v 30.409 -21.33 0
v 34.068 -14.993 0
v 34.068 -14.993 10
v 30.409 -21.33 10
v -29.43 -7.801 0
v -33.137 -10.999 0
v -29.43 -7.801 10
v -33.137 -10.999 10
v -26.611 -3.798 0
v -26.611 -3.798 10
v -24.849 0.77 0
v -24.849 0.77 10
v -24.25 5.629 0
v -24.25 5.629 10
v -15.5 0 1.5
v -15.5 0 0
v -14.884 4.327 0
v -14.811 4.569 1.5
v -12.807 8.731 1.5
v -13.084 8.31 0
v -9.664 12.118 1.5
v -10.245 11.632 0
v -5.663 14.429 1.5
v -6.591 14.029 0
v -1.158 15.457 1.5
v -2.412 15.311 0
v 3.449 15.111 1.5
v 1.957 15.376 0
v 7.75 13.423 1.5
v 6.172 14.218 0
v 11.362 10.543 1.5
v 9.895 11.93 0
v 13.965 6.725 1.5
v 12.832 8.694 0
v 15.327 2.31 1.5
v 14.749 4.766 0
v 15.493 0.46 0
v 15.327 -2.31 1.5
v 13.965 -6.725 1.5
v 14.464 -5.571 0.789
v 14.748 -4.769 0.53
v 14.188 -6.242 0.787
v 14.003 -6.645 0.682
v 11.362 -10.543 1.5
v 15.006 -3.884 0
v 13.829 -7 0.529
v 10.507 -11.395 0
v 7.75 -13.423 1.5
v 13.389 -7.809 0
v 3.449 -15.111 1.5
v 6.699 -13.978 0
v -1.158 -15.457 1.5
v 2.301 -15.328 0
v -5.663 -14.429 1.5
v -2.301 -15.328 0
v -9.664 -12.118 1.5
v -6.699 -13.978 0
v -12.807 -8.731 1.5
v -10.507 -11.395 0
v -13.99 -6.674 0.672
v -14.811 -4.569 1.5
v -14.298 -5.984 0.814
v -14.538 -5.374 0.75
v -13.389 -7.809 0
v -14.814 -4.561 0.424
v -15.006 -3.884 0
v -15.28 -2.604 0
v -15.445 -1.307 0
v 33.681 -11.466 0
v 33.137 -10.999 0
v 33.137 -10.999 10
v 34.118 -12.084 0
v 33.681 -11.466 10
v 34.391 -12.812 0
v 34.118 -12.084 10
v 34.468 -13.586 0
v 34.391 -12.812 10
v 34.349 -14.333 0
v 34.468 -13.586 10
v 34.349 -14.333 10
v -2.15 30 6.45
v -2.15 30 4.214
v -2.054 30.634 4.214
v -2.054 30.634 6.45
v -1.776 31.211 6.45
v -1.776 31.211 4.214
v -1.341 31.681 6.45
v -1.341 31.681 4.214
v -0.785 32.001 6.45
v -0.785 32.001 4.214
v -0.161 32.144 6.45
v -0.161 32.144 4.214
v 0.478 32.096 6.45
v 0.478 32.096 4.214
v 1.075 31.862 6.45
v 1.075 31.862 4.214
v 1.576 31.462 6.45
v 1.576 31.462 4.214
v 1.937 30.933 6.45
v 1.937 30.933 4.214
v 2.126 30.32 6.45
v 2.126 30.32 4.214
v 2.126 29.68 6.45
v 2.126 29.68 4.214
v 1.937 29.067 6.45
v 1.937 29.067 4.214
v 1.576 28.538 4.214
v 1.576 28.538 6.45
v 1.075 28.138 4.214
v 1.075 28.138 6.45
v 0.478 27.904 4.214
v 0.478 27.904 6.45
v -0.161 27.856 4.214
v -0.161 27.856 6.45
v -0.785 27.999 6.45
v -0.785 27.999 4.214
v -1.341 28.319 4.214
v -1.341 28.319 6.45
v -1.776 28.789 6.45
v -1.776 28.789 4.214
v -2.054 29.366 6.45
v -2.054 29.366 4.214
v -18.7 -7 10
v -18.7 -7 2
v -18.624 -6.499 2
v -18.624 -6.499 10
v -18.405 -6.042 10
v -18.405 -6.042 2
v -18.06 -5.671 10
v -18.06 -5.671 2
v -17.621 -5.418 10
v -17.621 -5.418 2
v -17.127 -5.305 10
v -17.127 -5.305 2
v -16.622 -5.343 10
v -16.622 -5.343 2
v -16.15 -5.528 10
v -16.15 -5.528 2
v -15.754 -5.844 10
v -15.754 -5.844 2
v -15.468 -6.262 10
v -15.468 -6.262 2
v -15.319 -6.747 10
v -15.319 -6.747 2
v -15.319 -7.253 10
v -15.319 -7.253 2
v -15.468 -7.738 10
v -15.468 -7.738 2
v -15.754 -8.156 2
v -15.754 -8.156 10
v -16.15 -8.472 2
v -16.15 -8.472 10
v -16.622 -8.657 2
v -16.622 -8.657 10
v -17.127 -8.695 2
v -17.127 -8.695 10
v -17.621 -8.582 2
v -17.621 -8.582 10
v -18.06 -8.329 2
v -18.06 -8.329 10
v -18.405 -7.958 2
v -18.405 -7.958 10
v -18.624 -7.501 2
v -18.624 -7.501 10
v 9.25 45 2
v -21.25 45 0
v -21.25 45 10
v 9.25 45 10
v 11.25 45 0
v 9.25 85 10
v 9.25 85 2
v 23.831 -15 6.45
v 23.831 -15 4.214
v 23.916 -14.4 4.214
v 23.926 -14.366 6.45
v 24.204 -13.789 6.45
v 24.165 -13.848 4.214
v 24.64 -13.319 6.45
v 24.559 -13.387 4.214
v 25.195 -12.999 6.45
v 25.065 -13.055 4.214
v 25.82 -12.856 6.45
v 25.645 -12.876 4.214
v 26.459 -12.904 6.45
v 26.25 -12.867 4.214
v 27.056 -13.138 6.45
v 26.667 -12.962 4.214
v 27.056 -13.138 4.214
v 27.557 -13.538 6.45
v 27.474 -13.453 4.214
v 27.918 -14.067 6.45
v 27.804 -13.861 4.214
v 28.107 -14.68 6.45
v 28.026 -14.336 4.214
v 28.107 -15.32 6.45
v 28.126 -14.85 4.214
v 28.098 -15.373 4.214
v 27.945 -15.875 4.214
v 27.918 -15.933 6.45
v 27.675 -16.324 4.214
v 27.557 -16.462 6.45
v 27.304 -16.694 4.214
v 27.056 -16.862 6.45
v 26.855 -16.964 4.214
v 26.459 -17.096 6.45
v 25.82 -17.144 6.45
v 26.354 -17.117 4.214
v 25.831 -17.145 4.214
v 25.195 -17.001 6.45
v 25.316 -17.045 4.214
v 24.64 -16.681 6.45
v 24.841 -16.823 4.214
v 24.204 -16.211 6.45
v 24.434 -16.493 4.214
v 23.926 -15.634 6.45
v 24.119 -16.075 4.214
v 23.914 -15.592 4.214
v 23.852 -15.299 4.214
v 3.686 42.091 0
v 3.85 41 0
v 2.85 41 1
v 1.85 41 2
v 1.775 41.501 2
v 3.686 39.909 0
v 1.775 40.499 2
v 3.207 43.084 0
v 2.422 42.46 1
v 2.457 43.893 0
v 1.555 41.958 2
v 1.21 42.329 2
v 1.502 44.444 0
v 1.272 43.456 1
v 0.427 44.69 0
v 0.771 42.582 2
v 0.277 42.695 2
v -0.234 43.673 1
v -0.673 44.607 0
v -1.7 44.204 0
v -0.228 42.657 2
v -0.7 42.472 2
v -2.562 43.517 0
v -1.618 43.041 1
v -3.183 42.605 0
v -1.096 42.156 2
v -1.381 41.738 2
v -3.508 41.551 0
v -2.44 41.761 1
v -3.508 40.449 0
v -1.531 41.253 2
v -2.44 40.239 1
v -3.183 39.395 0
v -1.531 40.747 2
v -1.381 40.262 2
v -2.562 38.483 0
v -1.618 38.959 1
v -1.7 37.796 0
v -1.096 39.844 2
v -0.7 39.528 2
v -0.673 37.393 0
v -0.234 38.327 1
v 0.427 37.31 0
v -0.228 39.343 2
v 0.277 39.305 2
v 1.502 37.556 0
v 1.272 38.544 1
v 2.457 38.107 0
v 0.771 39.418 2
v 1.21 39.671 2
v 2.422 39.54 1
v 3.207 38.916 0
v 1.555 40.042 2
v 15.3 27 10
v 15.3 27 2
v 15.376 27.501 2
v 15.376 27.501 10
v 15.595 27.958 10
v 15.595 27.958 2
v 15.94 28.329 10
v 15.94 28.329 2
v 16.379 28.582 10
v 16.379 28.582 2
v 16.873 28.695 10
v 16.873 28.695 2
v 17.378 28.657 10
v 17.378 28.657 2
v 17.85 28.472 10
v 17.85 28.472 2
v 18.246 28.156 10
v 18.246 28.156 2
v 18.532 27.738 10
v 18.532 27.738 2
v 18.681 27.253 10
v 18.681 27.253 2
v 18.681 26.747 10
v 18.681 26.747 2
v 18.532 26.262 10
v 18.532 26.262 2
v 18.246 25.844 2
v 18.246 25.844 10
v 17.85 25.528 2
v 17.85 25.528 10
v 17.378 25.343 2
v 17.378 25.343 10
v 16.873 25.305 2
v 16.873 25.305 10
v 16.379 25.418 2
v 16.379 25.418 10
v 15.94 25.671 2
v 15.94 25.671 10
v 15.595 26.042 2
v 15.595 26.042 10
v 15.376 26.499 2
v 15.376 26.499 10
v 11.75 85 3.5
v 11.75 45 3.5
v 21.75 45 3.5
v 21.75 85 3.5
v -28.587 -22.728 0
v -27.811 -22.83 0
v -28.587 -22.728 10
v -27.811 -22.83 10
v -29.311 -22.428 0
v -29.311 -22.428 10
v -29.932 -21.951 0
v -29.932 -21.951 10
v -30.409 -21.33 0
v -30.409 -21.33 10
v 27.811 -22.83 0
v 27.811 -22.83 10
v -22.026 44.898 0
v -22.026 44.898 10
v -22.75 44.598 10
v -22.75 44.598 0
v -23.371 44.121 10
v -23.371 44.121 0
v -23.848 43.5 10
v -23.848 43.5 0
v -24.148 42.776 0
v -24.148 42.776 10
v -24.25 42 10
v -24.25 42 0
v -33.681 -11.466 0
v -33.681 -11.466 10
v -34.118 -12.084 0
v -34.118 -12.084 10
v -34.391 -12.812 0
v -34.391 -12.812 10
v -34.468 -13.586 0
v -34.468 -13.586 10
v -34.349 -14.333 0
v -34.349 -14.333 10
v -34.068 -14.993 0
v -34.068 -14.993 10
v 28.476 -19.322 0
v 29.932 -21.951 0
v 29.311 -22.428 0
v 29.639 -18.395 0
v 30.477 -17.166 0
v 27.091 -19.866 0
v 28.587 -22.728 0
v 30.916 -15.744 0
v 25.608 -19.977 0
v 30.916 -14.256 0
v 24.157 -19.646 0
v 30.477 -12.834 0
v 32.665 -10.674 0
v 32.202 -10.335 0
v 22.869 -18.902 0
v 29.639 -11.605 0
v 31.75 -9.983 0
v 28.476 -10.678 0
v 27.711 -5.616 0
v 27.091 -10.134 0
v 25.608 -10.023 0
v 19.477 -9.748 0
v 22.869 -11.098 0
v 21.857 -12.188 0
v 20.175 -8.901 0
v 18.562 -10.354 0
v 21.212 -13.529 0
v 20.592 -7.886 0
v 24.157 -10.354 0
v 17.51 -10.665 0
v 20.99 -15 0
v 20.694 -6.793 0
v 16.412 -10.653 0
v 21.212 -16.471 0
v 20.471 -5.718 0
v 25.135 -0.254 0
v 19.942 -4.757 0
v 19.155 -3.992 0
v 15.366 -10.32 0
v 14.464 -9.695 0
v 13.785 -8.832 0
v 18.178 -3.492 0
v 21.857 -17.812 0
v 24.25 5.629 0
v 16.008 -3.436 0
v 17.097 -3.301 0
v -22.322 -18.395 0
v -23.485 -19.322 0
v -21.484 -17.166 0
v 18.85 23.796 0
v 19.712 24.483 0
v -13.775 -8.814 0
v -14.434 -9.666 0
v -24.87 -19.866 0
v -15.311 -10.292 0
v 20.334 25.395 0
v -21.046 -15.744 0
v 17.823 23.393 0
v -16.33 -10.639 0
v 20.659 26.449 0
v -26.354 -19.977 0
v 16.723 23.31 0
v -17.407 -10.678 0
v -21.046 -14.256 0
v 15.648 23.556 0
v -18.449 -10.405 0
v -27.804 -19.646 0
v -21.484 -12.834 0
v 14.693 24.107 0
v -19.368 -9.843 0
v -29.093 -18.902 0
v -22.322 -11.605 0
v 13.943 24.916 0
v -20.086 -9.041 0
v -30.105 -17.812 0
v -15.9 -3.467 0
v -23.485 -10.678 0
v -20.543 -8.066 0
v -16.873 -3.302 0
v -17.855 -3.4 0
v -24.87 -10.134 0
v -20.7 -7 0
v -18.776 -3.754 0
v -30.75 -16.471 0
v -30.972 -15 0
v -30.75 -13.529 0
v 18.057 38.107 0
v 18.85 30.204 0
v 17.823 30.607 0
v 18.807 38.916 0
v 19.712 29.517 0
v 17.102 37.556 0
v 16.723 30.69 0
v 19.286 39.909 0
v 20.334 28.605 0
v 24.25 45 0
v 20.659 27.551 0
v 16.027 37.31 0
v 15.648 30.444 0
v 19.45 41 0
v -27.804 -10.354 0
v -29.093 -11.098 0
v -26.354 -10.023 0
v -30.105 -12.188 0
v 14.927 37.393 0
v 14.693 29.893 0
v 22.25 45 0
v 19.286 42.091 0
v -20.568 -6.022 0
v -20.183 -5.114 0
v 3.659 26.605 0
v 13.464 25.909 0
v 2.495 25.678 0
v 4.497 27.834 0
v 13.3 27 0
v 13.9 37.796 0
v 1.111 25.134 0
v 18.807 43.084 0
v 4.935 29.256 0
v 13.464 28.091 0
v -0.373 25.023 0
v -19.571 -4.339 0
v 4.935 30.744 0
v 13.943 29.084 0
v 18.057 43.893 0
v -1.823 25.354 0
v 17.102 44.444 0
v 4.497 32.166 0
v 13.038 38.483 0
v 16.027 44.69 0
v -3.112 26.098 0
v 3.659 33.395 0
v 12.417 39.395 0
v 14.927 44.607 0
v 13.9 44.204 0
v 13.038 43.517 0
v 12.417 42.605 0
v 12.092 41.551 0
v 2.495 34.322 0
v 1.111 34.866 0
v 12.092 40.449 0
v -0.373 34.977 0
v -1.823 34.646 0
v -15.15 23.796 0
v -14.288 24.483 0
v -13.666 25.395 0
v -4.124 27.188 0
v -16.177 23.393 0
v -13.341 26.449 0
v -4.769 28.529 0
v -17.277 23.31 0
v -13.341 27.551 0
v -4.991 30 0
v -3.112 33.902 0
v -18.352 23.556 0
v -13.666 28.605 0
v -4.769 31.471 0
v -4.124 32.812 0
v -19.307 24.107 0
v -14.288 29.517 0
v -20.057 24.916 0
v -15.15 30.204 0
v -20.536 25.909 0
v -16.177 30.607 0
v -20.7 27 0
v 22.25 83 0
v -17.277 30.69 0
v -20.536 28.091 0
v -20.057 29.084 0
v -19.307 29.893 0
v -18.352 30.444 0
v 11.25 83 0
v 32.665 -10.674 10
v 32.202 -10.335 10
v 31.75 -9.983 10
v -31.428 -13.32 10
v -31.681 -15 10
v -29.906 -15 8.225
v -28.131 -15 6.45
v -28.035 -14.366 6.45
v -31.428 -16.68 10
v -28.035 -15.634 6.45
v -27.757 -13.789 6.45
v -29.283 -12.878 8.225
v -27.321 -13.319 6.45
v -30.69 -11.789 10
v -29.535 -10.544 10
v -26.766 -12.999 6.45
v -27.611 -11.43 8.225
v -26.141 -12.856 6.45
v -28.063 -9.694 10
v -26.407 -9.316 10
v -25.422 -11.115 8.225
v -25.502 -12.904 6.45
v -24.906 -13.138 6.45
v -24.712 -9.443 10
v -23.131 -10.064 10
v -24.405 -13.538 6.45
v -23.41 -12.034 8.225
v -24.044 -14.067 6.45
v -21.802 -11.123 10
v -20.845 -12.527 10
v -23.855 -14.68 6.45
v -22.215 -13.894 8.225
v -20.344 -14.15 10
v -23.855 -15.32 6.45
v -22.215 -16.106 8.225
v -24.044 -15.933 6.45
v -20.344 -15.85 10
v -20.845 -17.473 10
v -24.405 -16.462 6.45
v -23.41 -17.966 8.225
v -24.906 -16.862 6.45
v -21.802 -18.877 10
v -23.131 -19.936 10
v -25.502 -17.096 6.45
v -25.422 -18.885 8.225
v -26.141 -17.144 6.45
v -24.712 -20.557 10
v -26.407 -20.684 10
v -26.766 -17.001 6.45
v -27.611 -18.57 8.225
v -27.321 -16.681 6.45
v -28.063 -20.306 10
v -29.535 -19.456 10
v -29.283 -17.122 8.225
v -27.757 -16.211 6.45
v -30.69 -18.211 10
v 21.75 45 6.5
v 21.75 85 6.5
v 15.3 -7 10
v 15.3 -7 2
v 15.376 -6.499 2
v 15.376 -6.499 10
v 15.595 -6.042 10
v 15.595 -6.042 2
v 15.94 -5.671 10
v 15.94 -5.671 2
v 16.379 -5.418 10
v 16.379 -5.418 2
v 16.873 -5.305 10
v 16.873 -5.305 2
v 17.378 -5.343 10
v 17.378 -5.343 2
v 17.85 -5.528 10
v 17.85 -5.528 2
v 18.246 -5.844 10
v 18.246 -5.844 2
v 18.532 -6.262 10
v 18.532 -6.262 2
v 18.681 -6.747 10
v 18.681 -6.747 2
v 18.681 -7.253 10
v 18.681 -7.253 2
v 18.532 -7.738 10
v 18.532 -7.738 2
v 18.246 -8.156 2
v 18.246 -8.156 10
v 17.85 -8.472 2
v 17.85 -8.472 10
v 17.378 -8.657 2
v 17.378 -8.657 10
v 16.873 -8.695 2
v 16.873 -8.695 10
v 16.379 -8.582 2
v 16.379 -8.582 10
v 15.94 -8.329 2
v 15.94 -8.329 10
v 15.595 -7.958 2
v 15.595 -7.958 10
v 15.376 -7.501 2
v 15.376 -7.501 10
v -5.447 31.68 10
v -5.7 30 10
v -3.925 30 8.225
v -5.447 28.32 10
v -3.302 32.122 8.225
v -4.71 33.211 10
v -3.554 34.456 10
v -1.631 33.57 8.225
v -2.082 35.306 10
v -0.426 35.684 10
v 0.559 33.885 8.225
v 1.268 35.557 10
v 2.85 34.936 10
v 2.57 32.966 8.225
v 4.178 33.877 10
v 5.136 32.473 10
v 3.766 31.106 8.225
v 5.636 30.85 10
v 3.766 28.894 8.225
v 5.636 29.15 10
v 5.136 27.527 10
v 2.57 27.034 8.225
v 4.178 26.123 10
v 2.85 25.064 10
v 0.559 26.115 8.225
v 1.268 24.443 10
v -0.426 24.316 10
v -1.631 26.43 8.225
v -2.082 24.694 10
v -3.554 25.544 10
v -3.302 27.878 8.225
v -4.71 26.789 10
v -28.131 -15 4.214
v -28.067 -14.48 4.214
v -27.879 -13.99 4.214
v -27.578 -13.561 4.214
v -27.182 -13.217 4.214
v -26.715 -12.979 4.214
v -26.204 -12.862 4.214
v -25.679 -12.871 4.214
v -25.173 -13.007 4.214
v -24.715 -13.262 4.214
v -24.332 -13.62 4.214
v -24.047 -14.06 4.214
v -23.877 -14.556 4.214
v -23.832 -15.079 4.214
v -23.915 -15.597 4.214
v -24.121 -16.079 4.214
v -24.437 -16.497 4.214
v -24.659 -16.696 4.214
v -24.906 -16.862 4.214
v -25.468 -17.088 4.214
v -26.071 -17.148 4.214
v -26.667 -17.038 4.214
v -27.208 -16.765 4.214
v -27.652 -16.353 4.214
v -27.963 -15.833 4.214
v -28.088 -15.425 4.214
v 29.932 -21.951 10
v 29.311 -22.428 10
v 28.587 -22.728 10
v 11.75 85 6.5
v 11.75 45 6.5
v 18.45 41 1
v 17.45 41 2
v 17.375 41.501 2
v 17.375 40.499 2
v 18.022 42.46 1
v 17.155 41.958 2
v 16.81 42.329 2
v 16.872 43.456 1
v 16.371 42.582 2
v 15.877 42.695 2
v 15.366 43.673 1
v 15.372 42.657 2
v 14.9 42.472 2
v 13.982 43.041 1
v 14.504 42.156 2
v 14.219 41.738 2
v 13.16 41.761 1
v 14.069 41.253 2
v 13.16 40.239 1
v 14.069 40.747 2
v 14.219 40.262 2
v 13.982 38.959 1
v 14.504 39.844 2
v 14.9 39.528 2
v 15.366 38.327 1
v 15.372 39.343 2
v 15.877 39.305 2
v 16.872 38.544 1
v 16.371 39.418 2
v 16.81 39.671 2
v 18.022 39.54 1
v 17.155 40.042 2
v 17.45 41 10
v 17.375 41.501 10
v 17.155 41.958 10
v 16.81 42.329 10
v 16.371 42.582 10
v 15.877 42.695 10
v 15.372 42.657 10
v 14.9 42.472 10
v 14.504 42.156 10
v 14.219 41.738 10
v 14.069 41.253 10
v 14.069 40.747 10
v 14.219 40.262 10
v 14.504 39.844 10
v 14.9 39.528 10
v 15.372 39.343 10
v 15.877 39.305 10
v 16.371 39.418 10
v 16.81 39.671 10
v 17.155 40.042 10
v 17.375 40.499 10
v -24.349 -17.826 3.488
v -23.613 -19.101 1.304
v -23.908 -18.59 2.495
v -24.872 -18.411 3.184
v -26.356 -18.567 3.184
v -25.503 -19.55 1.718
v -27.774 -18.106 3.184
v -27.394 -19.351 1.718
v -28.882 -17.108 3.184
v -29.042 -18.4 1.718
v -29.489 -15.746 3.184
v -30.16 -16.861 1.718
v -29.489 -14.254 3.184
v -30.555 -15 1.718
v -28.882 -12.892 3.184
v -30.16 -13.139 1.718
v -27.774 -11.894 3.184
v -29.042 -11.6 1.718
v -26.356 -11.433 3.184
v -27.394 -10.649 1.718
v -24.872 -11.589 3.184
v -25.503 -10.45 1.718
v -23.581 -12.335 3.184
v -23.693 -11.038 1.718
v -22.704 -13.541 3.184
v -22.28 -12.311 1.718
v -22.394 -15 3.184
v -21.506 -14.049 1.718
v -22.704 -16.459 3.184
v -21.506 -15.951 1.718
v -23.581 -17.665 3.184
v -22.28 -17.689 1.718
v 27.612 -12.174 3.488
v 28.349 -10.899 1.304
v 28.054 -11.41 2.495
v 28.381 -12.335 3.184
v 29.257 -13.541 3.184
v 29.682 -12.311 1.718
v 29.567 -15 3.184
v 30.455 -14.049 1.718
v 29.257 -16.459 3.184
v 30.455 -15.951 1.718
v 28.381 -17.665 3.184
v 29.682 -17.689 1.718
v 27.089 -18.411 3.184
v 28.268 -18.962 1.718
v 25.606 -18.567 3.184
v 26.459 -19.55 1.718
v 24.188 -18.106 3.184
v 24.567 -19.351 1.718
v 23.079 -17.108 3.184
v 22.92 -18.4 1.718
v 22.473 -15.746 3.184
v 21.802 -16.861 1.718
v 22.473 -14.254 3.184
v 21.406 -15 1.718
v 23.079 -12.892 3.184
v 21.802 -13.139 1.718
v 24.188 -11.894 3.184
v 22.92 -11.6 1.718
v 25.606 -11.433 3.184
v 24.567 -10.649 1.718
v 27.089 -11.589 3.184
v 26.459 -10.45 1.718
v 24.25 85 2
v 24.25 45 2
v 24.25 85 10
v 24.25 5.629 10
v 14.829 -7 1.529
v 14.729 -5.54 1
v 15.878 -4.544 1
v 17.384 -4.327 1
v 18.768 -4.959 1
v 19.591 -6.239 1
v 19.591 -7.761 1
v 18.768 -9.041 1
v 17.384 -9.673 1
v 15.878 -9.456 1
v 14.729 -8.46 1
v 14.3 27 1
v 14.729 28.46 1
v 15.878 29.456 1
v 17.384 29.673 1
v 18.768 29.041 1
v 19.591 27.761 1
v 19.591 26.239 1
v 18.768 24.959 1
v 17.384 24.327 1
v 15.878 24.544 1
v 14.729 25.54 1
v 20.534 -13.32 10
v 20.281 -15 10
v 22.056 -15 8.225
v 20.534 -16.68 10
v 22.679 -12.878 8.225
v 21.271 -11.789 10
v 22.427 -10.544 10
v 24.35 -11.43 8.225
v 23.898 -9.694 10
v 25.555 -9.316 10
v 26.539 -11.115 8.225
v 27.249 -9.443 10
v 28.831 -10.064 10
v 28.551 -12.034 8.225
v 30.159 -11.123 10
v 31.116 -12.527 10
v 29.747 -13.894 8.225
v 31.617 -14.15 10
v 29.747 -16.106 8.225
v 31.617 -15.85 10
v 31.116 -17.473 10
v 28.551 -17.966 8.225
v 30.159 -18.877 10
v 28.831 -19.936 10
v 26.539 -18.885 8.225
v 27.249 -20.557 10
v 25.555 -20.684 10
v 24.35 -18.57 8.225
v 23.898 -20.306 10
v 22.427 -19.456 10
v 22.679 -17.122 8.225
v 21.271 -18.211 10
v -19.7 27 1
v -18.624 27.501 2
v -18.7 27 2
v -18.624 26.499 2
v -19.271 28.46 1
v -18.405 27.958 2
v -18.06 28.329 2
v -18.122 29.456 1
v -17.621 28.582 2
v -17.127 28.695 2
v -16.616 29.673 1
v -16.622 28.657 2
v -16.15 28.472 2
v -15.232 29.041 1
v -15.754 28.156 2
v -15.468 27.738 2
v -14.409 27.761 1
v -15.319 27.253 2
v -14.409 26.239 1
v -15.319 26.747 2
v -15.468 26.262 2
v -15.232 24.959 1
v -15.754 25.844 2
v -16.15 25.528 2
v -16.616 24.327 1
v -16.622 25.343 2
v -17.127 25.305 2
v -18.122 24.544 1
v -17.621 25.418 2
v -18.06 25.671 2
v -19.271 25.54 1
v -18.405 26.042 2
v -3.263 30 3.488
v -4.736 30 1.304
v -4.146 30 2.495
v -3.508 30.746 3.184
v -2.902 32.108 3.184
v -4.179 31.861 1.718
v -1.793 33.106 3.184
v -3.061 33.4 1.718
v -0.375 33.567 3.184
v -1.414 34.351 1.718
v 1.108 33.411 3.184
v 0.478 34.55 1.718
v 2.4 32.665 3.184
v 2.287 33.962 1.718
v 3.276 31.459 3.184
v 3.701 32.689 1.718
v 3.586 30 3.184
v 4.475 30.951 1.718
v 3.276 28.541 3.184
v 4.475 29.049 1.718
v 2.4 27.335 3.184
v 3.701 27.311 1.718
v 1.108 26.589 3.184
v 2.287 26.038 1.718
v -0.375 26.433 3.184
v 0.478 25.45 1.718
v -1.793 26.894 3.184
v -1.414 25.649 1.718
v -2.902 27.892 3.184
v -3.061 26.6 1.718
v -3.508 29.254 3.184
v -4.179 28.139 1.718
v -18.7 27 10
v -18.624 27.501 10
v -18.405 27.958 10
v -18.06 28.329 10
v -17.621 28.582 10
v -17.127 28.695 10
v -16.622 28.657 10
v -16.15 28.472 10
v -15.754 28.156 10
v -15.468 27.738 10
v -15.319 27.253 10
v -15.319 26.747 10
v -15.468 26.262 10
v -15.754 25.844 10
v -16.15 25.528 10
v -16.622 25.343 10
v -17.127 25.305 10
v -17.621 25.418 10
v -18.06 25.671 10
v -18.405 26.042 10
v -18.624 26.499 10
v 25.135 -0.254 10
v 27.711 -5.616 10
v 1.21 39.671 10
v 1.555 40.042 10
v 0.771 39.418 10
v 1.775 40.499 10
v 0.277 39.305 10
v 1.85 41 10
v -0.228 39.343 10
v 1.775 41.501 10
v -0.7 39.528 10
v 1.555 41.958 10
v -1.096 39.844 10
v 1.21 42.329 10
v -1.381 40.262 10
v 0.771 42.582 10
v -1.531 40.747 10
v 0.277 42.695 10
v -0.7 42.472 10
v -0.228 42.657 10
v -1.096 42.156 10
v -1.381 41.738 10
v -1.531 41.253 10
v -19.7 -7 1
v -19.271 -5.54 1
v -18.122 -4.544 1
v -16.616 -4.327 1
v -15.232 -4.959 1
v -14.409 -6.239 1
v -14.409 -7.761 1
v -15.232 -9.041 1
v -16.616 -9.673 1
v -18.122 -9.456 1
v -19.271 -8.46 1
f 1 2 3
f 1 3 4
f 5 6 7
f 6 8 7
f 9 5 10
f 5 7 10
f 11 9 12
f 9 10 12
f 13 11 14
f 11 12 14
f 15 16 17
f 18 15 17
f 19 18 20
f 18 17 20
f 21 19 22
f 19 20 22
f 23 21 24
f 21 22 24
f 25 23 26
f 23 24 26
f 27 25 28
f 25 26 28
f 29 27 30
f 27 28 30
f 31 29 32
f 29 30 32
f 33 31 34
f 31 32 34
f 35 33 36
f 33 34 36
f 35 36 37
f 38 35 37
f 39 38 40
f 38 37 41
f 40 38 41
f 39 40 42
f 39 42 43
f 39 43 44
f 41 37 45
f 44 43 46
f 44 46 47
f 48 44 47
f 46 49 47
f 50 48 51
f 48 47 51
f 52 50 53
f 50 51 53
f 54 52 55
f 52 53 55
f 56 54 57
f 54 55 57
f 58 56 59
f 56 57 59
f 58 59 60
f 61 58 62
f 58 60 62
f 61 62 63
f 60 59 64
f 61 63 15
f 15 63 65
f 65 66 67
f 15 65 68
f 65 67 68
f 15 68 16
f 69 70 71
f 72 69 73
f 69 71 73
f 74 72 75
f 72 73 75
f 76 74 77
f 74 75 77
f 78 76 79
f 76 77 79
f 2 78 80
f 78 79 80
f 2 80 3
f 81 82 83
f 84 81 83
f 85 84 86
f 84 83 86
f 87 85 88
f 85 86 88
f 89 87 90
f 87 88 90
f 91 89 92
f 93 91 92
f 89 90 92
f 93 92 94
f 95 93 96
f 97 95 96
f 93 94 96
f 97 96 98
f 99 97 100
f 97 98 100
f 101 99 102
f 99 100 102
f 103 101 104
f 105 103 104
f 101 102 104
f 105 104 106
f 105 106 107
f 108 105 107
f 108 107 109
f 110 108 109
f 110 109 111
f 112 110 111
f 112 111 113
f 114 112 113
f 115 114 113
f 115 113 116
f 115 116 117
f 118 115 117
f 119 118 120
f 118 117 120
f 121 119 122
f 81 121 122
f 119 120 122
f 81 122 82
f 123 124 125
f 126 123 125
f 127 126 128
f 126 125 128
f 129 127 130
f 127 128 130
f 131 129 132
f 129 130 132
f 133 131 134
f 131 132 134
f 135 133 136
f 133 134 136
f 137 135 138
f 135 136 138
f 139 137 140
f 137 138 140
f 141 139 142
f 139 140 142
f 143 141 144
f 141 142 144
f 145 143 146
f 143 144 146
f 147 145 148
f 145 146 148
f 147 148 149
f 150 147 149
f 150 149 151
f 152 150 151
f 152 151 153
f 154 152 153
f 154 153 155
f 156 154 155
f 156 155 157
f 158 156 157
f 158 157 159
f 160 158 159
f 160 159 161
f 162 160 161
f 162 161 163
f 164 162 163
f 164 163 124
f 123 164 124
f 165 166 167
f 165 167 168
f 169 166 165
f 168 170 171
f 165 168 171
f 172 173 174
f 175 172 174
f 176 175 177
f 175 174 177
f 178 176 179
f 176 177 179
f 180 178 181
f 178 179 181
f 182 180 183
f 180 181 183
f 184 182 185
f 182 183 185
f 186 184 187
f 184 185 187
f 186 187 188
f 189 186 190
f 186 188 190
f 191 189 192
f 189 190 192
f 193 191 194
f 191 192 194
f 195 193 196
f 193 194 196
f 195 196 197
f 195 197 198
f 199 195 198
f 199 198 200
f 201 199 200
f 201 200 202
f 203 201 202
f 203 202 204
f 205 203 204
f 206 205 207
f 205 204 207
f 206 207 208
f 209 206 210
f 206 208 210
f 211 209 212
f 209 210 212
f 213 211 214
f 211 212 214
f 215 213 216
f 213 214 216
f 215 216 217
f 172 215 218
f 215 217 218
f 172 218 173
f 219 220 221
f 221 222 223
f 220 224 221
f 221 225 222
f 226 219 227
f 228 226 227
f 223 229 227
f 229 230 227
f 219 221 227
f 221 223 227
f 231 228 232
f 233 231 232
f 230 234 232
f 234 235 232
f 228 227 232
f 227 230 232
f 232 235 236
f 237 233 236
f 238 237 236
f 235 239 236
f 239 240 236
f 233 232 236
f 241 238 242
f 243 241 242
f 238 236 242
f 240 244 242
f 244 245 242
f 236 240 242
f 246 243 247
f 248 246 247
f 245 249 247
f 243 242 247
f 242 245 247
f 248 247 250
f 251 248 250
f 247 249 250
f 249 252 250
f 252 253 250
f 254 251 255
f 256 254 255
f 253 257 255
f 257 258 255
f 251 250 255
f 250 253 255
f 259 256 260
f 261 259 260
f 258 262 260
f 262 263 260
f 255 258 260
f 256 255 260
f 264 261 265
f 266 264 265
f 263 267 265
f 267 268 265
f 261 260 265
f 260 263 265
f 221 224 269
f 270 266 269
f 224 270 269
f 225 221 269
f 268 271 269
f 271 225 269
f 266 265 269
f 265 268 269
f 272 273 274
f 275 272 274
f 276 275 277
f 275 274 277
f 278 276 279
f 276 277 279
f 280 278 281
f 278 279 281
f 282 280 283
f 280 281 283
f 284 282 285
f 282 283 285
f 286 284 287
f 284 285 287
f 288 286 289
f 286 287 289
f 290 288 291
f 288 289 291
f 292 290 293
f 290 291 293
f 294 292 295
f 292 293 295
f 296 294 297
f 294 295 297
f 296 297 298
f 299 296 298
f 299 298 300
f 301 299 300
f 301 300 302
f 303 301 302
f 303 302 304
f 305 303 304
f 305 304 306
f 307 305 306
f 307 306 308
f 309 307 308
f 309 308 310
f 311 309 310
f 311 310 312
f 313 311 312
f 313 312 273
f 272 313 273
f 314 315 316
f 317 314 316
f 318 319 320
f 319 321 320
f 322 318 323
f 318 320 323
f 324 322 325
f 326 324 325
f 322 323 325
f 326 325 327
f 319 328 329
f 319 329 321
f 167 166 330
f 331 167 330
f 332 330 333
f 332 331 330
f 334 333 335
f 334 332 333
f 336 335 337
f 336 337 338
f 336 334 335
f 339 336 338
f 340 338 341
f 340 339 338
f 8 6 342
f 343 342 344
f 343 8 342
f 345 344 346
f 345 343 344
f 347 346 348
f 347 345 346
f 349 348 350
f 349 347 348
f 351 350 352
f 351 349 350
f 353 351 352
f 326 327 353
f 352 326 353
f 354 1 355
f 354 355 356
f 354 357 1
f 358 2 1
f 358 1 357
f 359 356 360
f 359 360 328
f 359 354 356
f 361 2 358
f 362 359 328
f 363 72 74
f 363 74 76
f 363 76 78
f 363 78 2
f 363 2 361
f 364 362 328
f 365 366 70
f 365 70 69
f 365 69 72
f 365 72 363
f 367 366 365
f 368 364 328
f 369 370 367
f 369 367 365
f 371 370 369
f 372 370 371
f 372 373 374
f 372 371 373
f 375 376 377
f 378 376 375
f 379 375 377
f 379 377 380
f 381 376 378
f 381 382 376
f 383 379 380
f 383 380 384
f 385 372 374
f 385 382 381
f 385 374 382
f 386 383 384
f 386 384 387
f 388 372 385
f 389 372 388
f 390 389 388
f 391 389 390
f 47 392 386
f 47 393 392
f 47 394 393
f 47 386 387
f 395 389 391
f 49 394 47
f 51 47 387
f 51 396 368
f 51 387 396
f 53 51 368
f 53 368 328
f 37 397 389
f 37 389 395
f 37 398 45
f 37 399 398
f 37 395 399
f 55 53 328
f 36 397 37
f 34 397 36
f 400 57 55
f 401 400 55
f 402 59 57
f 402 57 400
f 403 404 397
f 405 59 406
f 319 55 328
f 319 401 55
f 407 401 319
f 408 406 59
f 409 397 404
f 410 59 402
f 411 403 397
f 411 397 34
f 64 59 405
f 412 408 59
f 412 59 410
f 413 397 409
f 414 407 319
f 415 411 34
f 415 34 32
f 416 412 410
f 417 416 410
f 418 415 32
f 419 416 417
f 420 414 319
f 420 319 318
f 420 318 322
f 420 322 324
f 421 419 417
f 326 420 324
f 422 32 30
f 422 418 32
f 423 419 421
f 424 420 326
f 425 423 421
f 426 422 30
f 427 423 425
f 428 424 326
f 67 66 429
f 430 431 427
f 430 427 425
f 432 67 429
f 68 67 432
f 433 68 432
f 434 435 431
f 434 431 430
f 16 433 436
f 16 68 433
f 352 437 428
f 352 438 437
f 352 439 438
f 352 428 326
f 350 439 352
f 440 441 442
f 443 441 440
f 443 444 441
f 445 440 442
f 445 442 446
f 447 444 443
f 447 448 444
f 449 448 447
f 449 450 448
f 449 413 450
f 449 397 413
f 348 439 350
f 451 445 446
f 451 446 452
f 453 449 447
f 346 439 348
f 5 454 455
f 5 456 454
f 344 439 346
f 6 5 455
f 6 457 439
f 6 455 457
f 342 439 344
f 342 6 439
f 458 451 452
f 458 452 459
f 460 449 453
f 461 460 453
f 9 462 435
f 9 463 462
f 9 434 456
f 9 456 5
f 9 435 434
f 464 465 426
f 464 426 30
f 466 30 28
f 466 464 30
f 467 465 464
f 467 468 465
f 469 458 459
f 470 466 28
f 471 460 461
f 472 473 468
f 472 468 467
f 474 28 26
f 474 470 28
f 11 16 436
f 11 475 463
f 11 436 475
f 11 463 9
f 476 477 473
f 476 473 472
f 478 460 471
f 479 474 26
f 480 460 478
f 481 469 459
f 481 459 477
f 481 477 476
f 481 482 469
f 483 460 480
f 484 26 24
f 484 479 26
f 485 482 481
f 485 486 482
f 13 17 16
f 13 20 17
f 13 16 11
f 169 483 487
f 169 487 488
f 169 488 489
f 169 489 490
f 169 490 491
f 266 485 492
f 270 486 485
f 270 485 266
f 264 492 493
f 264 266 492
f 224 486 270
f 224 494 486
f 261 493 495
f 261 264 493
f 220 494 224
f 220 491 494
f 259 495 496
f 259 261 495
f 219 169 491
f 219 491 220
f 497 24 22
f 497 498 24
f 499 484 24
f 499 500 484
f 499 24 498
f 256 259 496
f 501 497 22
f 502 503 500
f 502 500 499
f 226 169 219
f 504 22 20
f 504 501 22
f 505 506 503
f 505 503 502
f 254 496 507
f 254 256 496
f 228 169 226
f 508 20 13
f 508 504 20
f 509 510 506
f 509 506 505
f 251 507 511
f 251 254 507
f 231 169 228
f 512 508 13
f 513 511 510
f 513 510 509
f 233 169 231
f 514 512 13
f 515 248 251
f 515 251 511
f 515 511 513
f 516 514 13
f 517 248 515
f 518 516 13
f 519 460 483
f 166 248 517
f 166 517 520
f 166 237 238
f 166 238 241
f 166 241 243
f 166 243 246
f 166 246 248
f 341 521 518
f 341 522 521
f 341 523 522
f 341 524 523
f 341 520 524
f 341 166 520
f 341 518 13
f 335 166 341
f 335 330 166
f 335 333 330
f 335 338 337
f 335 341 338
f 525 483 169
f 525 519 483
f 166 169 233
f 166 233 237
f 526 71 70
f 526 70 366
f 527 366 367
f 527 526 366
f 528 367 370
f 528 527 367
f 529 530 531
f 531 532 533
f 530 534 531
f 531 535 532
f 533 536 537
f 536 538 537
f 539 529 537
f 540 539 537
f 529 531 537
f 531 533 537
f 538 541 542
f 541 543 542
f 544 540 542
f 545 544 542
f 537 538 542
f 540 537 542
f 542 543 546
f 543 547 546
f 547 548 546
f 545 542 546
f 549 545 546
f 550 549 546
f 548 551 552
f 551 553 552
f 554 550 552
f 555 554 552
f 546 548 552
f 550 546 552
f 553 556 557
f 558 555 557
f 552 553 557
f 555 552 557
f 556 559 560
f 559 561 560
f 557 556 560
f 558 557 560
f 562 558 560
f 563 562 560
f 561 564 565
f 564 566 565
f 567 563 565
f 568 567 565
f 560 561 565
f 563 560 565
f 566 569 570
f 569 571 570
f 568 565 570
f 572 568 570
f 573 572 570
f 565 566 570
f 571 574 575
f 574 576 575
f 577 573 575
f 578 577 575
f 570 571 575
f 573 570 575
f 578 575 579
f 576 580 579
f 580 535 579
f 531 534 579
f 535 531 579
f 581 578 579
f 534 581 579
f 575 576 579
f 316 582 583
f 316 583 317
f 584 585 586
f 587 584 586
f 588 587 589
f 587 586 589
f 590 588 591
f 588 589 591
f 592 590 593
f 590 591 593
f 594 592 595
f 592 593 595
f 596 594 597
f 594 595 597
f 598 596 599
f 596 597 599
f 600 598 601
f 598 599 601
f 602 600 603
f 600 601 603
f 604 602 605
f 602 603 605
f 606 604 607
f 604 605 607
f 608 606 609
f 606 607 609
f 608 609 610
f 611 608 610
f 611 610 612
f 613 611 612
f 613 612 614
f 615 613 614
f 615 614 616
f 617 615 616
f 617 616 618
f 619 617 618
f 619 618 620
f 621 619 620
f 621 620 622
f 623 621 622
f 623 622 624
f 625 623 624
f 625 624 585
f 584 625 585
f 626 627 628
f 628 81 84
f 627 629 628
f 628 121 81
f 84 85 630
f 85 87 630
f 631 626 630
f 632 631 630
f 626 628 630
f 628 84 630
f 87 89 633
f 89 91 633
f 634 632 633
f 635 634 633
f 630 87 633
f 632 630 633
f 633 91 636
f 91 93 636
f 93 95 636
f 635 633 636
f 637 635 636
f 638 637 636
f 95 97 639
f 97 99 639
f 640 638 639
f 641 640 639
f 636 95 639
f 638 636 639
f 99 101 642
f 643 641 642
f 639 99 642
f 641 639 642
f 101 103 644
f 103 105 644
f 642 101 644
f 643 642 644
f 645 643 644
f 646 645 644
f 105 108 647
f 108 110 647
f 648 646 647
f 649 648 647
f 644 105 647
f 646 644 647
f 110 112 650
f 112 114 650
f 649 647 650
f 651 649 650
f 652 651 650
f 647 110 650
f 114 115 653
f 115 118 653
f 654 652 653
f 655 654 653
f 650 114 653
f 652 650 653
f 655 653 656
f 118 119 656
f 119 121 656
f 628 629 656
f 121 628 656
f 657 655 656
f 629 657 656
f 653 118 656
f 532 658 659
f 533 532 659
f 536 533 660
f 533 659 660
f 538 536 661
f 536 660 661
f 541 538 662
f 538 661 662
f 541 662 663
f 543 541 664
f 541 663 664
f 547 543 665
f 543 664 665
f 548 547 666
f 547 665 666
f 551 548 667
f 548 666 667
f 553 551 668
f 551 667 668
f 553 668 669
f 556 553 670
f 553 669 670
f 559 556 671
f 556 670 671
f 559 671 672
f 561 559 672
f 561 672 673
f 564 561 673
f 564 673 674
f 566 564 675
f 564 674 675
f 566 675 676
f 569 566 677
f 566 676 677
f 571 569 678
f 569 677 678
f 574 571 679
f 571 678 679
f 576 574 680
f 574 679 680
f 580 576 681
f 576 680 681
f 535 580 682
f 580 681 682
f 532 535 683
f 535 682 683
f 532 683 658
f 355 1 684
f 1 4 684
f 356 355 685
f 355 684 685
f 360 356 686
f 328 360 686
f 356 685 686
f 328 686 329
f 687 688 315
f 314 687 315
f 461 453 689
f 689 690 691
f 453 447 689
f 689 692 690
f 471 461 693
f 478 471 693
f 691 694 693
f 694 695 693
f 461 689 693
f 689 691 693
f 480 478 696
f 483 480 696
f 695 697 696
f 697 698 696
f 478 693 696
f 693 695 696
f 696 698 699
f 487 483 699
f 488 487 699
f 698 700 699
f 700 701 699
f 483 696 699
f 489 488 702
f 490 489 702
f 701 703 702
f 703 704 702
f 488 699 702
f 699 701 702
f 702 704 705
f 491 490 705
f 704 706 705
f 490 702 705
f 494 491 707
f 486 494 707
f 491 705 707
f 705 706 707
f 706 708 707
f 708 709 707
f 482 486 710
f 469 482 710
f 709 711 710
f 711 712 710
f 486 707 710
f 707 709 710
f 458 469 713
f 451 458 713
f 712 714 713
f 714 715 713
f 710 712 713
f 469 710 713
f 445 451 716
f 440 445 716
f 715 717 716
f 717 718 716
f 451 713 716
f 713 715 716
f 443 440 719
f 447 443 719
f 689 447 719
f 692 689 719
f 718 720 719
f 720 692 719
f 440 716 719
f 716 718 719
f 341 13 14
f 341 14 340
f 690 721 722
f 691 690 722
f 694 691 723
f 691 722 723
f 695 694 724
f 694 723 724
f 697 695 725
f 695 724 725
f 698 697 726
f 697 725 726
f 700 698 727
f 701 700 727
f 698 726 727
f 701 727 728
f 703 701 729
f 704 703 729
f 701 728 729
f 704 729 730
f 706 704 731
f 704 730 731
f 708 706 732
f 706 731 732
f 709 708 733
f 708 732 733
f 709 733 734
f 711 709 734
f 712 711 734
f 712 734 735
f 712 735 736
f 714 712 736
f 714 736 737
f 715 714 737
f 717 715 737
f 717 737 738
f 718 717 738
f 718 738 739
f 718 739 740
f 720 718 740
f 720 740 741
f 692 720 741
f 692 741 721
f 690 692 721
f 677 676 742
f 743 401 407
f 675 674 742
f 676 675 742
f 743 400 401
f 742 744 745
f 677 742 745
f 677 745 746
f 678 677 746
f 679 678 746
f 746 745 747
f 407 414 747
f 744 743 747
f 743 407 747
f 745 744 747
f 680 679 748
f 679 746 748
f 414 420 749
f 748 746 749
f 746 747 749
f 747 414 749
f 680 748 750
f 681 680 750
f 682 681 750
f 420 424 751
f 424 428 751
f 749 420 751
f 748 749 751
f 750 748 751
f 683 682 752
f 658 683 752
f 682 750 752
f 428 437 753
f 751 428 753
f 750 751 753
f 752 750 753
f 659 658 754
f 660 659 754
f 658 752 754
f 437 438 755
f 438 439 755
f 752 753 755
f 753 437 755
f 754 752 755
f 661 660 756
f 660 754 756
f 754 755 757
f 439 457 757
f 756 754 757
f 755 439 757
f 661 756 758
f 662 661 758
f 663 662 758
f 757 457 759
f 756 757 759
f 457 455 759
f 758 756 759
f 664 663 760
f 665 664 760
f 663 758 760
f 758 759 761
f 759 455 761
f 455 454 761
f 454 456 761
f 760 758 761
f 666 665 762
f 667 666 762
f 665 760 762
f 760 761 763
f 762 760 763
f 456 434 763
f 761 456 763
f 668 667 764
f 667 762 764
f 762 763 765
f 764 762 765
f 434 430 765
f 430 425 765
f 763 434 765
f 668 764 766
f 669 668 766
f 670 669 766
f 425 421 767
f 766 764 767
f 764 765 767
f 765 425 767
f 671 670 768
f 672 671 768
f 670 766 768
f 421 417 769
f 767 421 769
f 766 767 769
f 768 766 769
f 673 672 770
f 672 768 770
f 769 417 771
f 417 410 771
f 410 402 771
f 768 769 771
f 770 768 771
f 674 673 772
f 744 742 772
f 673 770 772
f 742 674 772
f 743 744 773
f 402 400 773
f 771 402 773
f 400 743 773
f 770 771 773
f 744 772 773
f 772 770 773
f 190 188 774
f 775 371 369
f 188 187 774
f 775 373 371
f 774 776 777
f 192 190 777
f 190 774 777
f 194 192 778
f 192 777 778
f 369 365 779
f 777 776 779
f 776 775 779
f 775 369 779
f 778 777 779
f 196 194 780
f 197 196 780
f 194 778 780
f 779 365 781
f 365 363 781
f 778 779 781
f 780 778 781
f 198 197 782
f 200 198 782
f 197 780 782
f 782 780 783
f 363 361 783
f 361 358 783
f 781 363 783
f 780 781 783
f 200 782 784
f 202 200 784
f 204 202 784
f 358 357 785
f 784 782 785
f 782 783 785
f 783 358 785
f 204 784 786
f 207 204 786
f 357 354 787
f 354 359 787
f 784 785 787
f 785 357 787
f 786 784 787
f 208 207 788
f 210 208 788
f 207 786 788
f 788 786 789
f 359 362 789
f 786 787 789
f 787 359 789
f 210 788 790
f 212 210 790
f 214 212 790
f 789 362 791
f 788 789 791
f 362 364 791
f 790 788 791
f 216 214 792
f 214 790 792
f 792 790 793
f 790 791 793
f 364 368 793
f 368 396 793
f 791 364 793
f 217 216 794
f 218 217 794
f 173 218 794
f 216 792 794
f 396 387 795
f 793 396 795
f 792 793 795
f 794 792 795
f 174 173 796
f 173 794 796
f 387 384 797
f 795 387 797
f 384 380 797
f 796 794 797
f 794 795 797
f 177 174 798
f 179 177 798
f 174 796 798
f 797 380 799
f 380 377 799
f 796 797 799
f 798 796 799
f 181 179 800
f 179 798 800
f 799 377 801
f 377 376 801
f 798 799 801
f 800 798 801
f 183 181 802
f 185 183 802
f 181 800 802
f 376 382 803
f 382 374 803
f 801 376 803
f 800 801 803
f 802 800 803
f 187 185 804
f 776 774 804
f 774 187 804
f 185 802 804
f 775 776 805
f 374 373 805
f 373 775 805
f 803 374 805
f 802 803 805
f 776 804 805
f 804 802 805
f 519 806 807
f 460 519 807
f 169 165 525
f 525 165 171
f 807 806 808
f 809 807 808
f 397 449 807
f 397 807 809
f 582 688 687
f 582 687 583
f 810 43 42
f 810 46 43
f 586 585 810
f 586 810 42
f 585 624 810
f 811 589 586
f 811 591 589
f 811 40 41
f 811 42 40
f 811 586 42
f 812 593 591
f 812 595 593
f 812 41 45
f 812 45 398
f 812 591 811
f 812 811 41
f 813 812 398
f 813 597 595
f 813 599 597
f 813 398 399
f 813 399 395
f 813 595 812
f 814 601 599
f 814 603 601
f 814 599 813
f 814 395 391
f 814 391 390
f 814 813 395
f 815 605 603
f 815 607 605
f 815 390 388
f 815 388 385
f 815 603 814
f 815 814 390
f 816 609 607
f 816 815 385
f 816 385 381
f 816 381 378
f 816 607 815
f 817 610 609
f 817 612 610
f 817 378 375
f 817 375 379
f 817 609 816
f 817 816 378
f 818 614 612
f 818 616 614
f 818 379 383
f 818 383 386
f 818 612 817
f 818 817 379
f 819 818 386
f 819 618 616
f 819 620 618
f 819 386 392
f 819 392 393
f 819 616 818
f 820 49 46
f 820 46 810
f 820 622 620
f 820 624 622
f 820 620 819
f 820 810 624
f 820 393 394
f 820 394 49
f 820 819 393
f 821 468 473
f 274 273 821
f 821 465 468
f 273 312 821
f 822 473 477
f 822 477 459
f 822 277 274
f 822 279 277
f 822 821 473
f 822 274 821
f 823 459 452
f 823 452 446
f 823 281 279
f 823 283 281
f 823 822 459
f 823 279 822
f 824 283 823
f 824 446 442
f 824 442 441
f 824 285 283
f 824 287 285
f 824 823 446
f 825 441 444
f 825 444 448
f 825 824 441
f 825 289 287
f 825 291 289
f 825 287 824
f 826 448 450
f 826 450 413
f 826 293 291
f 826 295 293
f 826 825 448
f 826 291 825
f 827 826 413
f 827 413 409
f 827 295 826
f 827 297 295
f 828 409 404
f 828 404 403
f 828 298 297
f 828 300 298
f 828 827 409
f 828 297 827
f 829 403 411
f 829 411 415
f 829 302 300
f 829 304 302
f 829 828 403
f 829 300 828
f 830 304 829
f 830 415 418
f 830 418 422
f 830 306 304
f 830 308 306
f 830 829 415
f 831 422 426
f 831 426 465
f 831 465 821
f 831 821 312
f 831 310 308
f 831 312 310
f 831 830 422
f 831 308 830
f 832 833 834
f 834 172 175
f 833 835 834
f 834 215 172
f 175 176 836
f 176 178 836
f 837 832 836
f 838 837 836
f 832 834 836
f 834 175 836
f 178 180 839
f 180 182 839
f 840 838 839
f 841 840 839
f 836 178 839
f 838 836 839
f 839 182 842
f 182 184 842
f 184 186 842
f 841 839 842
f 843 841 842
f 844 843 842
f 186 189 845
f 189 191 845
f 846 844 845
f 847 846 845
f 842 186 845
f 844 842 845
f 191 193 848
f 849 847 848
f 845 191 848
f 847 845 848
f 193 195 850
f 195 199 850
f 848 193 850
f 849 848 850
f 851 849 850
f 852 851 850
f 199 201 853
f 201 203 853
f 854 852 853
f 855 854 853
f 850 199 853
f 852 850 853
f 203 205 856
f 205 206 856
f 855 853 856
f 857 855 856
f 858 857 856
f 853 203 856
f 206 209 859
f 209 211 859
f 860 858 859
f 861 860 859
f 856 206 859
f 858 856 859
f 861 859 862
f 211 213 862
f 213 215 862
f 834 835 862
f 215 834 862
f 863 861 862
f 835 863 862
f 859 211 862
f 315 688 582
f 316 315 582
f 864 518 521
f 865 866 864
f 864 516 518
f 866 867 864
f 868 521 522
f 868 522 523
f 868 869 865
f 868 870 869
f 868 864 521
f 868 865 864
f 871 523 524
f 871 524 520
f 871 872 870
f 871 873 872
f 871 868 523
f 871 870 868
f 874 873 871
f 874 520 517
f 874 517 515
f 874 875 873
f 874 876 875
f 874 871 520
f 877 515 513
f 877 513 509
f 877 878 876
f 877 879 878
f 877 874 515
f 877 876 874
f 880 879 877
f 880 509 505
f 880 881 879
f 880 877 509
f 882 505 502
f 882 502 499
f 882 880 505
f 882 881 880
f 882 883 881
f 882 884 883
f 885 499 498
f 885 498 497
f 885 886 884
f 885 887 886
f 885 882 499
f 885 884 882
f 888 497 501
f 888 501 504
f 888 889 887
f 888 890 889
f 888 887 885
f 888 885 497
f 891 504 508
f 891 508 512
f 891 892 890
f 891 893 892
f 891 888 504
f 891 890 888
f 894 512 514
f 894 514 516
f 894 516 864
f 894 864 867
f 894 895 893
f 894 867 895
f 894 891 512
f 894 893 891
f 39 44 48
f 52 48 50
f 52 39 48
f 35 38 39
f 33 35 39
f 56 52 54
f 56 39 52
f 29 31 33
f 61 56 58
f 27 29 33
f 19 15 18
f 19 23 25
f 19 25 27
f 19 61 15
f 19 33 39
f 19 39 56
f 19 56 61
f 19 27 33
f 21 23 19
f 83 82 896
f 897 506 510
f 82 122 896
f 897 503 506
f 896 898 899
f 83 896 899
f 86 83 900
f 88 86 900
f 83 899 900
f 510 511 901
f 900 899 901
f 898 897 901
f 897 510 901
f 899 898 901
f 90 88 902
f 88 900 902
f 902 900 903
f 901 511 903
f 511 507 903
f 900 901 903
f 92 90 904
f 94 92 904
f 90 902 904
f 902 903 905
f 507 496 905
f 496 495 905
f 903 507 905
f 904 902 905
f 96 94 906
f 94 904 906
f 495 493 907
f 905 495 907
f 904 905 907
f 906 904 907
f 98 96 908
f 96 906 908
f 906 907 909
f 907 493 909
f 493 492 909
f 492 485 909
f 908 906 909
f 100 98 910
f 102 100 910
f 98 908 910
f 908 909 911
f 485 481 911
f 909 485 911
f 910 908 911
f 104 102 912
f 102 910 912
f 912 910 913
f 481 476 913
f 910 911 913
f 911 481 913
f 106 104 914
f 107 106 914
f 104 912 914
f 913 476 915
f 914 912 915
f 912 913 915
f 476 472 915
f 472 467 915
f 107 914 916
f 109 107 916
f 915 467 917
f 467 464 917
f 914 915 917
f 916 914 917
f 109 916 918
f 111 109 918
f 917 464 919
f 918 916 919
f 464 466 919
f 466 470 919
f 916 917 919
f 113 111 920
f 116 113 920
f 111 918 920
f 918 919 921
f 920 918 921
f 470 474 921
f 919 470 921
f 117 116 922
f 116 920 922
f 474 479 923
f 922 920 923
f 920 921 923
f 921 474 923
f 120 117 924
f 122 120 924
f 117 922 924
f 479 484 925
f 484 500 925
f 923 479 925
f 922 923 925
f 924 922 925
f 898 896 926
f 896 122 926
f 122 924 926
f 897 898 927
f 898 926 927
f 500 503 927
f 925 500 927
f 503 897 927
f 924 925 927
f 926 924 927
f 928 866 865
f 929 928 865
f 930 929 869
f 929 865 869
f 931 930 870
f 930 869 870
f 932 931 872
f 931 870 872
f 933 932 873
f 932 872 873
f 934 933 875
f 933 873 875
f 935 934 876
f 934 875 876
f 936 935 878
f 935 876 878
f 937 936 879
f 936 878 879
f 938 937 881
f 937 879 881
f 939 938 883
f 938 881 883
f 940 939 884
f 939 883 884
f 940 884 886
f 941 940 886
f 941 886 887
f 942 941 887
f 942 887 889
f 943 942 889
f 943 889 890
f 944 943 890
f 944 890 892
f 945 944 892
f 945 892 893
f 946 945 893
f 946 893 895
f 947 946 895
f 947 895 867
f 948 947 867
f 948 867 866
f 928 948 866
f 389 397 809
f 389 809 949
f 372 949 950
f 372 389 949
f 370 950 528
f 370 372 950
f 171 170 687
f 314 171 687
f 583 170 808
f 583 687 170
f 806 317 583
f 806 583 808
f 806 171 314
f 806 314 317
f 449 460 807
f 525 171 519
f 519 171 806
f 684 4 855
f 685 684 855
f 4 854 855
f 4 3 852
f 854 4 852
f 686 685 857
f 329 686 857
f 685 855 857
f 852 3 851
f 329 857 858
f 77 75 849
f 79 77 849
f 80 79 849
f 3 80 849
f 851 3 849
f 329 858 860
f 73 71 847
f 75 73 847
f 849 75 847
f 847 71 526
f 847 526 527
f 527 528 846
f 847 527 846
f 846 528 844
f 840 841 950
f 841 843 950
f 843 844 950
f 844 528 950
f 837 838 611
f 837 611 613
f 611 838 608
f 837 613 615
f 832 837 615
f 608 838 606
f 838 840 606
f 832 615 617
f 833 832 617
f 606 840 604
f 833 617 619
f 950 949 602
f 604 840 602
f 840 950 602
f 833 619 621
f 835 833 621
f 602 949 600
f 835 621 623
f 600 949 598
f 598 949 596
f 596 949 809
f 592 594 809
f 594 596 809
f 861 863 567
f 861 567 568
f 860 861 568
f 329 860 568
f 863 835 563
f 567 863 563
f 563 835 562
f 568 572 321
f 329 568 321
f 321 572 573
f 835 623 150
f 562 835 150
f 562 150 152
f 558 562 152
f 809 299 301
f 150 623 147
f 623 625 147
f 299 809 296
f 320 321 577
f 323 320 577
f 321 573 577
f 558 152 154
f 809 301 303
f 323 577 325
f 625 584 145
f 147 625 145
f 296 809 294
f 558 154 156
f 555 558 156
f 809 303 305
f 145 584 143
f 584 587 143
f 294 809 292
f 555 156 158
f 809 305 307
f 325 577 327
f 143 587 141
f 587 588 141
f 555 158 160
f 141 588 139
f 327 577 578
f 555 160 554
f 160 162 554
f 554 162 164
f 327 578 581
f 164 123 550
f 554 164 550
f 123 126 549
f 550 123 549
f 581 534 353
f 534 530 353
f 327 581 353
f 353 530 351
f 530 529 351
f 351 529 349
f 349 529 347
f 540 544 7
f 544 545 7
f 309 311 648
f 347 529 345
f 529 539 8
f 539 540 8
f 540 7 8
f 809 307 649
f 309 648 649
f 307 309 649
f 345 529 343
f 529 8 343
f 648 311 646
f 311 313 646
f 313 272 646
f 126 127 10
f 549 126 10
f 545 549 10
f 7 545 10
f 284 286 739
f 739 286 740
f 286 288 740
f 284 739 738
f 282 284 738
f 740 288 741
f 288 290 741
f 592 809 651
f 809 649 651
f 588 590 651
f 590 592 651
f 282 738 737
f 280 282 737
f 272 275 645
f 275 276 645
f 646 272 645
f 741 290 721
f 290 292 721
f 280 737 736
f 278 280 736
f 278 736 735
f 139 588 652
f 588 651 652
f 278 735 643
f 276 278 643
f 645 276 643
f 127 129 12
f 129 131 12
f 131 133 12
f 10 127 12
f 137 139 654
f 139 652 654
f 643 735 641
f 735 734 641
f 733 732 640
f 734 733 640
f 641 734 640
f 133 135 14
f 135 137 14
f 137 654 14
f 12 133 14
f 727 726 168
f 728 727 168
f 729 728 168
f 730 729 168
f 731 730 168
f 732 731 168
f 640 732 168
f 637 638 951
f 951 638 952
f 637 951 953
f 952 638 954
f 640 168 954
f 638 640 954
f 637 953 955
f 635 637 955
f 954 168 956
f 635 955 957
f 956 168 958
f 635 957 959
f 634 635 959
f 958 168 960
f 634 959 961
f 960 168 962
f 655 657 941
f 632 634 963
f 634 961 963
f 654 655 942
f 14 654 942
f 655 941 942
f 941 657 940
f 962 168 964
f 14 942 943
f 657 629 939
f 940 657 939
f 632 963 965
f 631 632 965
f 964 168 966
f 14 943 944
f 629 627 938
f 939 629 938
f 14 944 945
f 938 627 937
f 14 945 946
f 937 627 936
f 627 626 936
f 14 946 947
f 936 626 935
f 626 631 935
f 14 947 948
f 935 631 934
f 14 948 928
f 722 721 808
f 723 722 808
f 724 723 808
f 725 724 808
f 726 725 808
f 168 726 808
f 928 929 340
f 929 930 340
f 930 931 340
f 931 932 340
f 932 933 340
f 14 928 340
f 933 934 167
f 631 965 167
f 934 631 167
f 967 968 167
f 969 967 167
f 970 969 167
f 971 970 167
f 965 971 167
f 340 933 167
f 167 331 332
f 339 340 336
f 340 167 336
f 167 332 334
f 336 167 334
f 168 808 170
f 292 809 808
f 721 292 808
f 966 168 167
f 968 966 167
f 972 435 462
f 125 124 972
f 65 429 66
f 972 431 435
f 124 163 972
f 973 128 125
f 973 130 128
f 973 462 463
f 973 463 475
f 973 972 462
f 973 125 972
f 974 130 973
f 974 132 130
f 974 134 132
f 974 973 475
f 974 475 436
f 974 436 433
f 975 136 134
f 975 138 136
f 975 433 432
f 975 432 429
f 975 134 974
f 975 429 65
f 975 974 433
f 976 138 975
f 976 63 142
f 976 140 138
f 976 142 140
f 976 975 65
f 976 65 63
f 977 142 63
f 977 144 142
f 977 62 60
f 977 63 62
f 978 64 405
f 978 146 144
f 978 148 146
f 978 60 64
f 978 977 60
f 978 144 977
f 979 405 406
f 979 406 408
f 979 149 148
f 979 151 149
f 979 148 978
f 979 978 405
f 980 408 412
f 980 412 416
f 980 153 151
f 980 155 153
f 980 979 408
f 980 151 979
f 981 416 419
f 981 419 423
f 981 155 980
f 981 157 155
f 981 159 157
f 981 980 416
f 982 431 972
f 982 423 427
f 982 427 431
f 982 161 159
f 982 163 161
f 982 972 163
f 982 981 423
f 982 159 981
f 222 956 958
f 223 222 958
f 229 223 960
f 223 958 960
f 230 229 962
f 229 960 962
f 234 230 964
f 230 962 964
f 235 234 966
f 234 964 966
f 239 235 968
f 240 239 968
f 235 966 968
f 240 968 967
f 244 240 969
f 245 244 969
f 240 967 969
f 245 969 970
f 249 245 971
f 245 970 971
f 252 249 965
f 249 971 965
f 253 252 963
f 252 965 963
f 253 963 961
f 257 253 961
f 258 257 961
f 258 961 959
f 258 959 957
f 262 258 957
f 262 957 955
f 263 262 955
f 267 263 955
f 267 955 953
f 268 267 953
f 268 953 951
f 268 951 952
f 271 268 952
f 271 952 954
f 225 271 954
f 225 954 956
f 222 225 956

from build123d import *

# Parameters (mm, degrees)
SKETCH2_R                                       = 7.5
BOSS_EXTRUDE1_DEPTH                             = 10
CSK_FOR_M4_FLAT_HEAD_MACHINE_SCREW1_D           = 4.3
CSK_FOR_M4_FLAT_HEAD_MACHINE_SCREW1_CSINK_D     = 11.4
CSK_FOR_M4_FLAT_HEAD_MACHINE_SCREW1_CSINK_ANGLE = 90
FILLET1_R                                       = 20
CIRPATTERN2_COUNT                               = 3
FILLET2_R                                       = 3
SKETCH47_R                                      = 1.7
CUT_EXTRUDE1_DEPTH                              = 58.559983963
SKETCH49_W                                      = 15
SKETCH49_H                                      = 10
SKETCH49_W_2                                    = 10
SKETCH49_H_2                                    = 3
BOSS_EXTRUDE2_DEPTH                             = 40
CHAMFER1_SIZE                                   = 2
BOSS_EXTRUDE3_REACH                             = 78.74
SKETCH51_W                                      = 3
SKETCH51_H                                      = 10
BOSS_EXTRUDE4_DEPTH                             = 10
SKETCH48_R                                      = 1.7
CUT_EXTRUDE2_DEPTH                              = 93.266742447
CHAMFER4_SIZE                                   = 2
CHAMFER3_SIZE                                   = 2
SKETCH53_R                                      = 15.5
CUT_EXTRUDE3_DEPTH                              = 1.5
SKETCH54_R                                      = 7.5
BOSS_EXTRUDE5_DEPTH                             = 8.5
CUT_EXTRUDE4_DEPTH                              = 93.266742447


with BuildPart() as part:
    # Sketch2 → Boss-Extrude1 (new body)
    with BuildSketch(Plane.XY):
        Polygon((-24.25, 45), (24.25, 45), (24.25, -5.917840259), (35.54293994, -12.437822174), (29.54293994, -22.830127019), (-29.54293994, -22.830127019), (-35.54293994, -12.437822174), (-24.25, -5.917840259), align=None)
        Circle(SKETCH2_R, mode=Mode.SUBTRACT)
    extrude(amount=BOSS_EXTRUDE1_DEPTH)

    # CSK for M4 Flat Head Machine Screw1 (through all)
    with Locations(Plane.XY.offset(10)):
        with Locations((-25.980762114, -15), (0, 30), (25.980762114, -15)):
            CounterSinkHole(CSK_FOR_M4_FLAT_HEAD_MACHINE_SCREW1_D / 2, CSK_FOR_M4_FLAT_HEAD_MACHINE_SCREW1_CSINK_D / 2, counter_sink_angle=CSK_FOR_M4_FLAT_HEAD_MACHINE_SCREW1_CSINK_ANGLE)

    # Fillet1
    fillet1_edges = [part.edges().sort_by_distance(p)[0] for p in [
        (24.25, -5.917840259, 5),
        (-24.25, -5.917840259, 5),
    ]]
    fillet(fillet1_edges, radius=FILLET1_R)

    # Sketch46 → tool ball cutout (revolve, cut)
    with BuildSketch(Plane(origin=(0, 30, 0), x_dir=(1, 0, 0), z_dir=(0, 1, 0))):
        with BuildLine():
            Line((0, 5.3), (0, -4.7))
            ThreePointArc((0, -4.7), (-5, 0.3), (0, 5.3))
        make_face()
    tool_ball_cutout = revolve(axis=Axis((0, 30, 0), (0, 0, -1)), mode=Mode.SUBTRACT)

    # CirPattern2: tool ball cutout ×3 about axis
    cirpattern2_axis = Axis((0, 0, 0), (0, 0, 1))
    for i in range(1, CIRPATTERN2_COUNT):
        add(tool_ball_cutout.rotate(cirpattern2_axis, i * 360 / CIRPATTERN2_COUNT), mode=Mode.SUBTRACT)

    # Fillet2
    fillet2_edges = [part.edges().sort_by_distance(p)[0] for p in [
        (24.25, 45, 5),
        (-24.25, 45, 5),
        (-29.54293994, -22.830127019, 5),
        (-35.54293994, -12.437822174, 5),
        (29.54293994, -22.830127019, 5),
        (35.54293994, -12.437822174, 5),
    ]]
    fillet(fillet2_edges, radius=FILLET2_R)

    # Sketch47 → Cut-Extrude1 (cut, through all)
    with BuildSketch(Plane(origin=(0, 0, 0), x_dir=(-1, 0, 0), z_dir=(0, 0, -1))):
        with Locations((-17, 27)):
            Circle(SKETCH47_R)
        with Locations((17, 27)):
            Circle(SKETCH47_R)
        with Locations((17, -7)):
            Circle(SKETCH47_R)
        with Locations((-17, -7)):
            Circle(SKETCH47_R)
    extrude(amount=-CUT_EXTRUDE1_DEPTH, mode=Mode.SUBTRACT)

    # Sketch49 → Boss-Extrude2 (add)
    with BuildSketch(Plane(origin=(0, 45, 0), x_dir=(1, 0, 0), z_dir=(0, 1, 0))):
        with Locations((16.75, -5)):
            Rectangle(SKETCH49_W, SKETCH49_H)
        with Locations((16.75, -5)):
            Rectangle(SKETCH49_W_2, SKETCH49_H_2, mode=Mode.SUBTRACT)
    extrude(amount=BOSS_EXTRUDE2_DEPTH)

    # Chamfer1
    chamfer1_edges = [part.edges().sort_by_distance(p)[0] for p in [
        (18.7, -7, 0),
        (-15.3, -7, 0),
        (-15.3, 27, 0),
        (18.7, 27, 0),
    ]]
    chamfer(chamfer1_edges, length=CHAMFER1_SIZE)

    # Sketch51 → Boss-Extrude3 (add, up to next)
    with BuildSketch(Plane.XZ.offset(-45), mode=Mode.PRIVATE) as boss_extrude3_sk1:
        with Locations((22.75, 5)):
            Rectangle(SKETCH51_W, SKETCH51_H)
    boss_extrude3_tool1 = extrude(boss_extrude3_sk1.sketch, amount=BOSS_EXTRUDE3_REACH, mode=Mode.PRIVATE) - part.part
    add(boss_extrude3_tool1.solids().sort_by_distance((22.75, 45, 5))[0])

    # Sketch52 → Boss-Extrude4 (add)
    with BuildSketch(Plane.XY.offset(10)):
        with BuildLine():
            Line((24.25, 45), (31.75, 45))
            Line((31.75, 45), (31.75, -9.983329871))
            ThreePointArc((31.75, -9.983329871), (26.222243623, -3.031088913), (24.25, 5.629165125))
            Line((24.25, 5.629165125), (24.25, 45))
        make_face()
    extrude(amount=-BOSS_EXTRUDE4_DEPTH)

    # Sketch48 → Cut-Extrude2 (cut, through all)
    with BuildSketch(Plane.XY.offset(10)):
        with Locations((0.150338606, 41)):
            Circle(SKETCH48_R)
        with Locations((15.750338606, 41)):
            Circle(SKETCH48_R)
    extrude(amount=-CUT_EXTRUDE2_DEPTH, mode=Mode.SUBTRACT)

    # Chamfer4
    chamfer4_edges = [part.edges().sort_by_distance(p)[0] for p in [
        (-1.549661394, 41, 0),
        (14.050338606, 41, 0),
    ]]
    chamfer(chamfer4_edges, length=CHAMFER4_SIZE)

    # Chamfer3
    chamfer3_edges = [part.edges().sort_by_distance(p)[0] for p in [
        (16.75, 85, 0),
        (9.25, 65, 0),
        (24.25, 65, 0),
    ]]
    chamfer(chamfer3_edges, length=CHAMFER3_SIZE)

    # Sketch53 → Cut-Extrude3 (cut)
    with BuildSketch(Plane(origin=(0, 0, 0), x_dir=(-1, 0, 0), z_dir=(0, 0, -1))):
        Circle(SKETCH53_R)
    extrude(amount=-CUT_EXTRUDE3_DEPTH, mode=Mode.SUBTRACT)

    # Sketch54 → Boss-Extrude5 (add)
    with BuildSketch(Plane(origin=(0, 0, 1.5), x_dir=(-1, 0, 0), z_dir=(0, 0, -1))):
        Circle(SKETCH54_R)
    extrude(amount=-BOSS_EXTRUDE5_DEPTH)

    # Sketch55 → Cut-Extrude4 (cut, through all)
    with BuildSketch(Plane(origin=(0, 0, 0), x_dir=(-1, 0, 0), z_dir=(0, 0, -1))):
        with BuildLine():
            Line((-24.25, 45), (-24.25, 5.629165125))
            ThreePointArc((-24.25, 5.629165125), (-26.222243623, -3.031088913), (-31.75, -9.983329871))
            Line((-31.75, -9.983329871), (-31.75, 45))
            Line((-31.75, 45), (-24.25, 45))
        make_face()
    extrude(amount=-CUT_EXTRUDE4_DEPTH, mode=Mode.SUBTRACT)


solid = part.part
